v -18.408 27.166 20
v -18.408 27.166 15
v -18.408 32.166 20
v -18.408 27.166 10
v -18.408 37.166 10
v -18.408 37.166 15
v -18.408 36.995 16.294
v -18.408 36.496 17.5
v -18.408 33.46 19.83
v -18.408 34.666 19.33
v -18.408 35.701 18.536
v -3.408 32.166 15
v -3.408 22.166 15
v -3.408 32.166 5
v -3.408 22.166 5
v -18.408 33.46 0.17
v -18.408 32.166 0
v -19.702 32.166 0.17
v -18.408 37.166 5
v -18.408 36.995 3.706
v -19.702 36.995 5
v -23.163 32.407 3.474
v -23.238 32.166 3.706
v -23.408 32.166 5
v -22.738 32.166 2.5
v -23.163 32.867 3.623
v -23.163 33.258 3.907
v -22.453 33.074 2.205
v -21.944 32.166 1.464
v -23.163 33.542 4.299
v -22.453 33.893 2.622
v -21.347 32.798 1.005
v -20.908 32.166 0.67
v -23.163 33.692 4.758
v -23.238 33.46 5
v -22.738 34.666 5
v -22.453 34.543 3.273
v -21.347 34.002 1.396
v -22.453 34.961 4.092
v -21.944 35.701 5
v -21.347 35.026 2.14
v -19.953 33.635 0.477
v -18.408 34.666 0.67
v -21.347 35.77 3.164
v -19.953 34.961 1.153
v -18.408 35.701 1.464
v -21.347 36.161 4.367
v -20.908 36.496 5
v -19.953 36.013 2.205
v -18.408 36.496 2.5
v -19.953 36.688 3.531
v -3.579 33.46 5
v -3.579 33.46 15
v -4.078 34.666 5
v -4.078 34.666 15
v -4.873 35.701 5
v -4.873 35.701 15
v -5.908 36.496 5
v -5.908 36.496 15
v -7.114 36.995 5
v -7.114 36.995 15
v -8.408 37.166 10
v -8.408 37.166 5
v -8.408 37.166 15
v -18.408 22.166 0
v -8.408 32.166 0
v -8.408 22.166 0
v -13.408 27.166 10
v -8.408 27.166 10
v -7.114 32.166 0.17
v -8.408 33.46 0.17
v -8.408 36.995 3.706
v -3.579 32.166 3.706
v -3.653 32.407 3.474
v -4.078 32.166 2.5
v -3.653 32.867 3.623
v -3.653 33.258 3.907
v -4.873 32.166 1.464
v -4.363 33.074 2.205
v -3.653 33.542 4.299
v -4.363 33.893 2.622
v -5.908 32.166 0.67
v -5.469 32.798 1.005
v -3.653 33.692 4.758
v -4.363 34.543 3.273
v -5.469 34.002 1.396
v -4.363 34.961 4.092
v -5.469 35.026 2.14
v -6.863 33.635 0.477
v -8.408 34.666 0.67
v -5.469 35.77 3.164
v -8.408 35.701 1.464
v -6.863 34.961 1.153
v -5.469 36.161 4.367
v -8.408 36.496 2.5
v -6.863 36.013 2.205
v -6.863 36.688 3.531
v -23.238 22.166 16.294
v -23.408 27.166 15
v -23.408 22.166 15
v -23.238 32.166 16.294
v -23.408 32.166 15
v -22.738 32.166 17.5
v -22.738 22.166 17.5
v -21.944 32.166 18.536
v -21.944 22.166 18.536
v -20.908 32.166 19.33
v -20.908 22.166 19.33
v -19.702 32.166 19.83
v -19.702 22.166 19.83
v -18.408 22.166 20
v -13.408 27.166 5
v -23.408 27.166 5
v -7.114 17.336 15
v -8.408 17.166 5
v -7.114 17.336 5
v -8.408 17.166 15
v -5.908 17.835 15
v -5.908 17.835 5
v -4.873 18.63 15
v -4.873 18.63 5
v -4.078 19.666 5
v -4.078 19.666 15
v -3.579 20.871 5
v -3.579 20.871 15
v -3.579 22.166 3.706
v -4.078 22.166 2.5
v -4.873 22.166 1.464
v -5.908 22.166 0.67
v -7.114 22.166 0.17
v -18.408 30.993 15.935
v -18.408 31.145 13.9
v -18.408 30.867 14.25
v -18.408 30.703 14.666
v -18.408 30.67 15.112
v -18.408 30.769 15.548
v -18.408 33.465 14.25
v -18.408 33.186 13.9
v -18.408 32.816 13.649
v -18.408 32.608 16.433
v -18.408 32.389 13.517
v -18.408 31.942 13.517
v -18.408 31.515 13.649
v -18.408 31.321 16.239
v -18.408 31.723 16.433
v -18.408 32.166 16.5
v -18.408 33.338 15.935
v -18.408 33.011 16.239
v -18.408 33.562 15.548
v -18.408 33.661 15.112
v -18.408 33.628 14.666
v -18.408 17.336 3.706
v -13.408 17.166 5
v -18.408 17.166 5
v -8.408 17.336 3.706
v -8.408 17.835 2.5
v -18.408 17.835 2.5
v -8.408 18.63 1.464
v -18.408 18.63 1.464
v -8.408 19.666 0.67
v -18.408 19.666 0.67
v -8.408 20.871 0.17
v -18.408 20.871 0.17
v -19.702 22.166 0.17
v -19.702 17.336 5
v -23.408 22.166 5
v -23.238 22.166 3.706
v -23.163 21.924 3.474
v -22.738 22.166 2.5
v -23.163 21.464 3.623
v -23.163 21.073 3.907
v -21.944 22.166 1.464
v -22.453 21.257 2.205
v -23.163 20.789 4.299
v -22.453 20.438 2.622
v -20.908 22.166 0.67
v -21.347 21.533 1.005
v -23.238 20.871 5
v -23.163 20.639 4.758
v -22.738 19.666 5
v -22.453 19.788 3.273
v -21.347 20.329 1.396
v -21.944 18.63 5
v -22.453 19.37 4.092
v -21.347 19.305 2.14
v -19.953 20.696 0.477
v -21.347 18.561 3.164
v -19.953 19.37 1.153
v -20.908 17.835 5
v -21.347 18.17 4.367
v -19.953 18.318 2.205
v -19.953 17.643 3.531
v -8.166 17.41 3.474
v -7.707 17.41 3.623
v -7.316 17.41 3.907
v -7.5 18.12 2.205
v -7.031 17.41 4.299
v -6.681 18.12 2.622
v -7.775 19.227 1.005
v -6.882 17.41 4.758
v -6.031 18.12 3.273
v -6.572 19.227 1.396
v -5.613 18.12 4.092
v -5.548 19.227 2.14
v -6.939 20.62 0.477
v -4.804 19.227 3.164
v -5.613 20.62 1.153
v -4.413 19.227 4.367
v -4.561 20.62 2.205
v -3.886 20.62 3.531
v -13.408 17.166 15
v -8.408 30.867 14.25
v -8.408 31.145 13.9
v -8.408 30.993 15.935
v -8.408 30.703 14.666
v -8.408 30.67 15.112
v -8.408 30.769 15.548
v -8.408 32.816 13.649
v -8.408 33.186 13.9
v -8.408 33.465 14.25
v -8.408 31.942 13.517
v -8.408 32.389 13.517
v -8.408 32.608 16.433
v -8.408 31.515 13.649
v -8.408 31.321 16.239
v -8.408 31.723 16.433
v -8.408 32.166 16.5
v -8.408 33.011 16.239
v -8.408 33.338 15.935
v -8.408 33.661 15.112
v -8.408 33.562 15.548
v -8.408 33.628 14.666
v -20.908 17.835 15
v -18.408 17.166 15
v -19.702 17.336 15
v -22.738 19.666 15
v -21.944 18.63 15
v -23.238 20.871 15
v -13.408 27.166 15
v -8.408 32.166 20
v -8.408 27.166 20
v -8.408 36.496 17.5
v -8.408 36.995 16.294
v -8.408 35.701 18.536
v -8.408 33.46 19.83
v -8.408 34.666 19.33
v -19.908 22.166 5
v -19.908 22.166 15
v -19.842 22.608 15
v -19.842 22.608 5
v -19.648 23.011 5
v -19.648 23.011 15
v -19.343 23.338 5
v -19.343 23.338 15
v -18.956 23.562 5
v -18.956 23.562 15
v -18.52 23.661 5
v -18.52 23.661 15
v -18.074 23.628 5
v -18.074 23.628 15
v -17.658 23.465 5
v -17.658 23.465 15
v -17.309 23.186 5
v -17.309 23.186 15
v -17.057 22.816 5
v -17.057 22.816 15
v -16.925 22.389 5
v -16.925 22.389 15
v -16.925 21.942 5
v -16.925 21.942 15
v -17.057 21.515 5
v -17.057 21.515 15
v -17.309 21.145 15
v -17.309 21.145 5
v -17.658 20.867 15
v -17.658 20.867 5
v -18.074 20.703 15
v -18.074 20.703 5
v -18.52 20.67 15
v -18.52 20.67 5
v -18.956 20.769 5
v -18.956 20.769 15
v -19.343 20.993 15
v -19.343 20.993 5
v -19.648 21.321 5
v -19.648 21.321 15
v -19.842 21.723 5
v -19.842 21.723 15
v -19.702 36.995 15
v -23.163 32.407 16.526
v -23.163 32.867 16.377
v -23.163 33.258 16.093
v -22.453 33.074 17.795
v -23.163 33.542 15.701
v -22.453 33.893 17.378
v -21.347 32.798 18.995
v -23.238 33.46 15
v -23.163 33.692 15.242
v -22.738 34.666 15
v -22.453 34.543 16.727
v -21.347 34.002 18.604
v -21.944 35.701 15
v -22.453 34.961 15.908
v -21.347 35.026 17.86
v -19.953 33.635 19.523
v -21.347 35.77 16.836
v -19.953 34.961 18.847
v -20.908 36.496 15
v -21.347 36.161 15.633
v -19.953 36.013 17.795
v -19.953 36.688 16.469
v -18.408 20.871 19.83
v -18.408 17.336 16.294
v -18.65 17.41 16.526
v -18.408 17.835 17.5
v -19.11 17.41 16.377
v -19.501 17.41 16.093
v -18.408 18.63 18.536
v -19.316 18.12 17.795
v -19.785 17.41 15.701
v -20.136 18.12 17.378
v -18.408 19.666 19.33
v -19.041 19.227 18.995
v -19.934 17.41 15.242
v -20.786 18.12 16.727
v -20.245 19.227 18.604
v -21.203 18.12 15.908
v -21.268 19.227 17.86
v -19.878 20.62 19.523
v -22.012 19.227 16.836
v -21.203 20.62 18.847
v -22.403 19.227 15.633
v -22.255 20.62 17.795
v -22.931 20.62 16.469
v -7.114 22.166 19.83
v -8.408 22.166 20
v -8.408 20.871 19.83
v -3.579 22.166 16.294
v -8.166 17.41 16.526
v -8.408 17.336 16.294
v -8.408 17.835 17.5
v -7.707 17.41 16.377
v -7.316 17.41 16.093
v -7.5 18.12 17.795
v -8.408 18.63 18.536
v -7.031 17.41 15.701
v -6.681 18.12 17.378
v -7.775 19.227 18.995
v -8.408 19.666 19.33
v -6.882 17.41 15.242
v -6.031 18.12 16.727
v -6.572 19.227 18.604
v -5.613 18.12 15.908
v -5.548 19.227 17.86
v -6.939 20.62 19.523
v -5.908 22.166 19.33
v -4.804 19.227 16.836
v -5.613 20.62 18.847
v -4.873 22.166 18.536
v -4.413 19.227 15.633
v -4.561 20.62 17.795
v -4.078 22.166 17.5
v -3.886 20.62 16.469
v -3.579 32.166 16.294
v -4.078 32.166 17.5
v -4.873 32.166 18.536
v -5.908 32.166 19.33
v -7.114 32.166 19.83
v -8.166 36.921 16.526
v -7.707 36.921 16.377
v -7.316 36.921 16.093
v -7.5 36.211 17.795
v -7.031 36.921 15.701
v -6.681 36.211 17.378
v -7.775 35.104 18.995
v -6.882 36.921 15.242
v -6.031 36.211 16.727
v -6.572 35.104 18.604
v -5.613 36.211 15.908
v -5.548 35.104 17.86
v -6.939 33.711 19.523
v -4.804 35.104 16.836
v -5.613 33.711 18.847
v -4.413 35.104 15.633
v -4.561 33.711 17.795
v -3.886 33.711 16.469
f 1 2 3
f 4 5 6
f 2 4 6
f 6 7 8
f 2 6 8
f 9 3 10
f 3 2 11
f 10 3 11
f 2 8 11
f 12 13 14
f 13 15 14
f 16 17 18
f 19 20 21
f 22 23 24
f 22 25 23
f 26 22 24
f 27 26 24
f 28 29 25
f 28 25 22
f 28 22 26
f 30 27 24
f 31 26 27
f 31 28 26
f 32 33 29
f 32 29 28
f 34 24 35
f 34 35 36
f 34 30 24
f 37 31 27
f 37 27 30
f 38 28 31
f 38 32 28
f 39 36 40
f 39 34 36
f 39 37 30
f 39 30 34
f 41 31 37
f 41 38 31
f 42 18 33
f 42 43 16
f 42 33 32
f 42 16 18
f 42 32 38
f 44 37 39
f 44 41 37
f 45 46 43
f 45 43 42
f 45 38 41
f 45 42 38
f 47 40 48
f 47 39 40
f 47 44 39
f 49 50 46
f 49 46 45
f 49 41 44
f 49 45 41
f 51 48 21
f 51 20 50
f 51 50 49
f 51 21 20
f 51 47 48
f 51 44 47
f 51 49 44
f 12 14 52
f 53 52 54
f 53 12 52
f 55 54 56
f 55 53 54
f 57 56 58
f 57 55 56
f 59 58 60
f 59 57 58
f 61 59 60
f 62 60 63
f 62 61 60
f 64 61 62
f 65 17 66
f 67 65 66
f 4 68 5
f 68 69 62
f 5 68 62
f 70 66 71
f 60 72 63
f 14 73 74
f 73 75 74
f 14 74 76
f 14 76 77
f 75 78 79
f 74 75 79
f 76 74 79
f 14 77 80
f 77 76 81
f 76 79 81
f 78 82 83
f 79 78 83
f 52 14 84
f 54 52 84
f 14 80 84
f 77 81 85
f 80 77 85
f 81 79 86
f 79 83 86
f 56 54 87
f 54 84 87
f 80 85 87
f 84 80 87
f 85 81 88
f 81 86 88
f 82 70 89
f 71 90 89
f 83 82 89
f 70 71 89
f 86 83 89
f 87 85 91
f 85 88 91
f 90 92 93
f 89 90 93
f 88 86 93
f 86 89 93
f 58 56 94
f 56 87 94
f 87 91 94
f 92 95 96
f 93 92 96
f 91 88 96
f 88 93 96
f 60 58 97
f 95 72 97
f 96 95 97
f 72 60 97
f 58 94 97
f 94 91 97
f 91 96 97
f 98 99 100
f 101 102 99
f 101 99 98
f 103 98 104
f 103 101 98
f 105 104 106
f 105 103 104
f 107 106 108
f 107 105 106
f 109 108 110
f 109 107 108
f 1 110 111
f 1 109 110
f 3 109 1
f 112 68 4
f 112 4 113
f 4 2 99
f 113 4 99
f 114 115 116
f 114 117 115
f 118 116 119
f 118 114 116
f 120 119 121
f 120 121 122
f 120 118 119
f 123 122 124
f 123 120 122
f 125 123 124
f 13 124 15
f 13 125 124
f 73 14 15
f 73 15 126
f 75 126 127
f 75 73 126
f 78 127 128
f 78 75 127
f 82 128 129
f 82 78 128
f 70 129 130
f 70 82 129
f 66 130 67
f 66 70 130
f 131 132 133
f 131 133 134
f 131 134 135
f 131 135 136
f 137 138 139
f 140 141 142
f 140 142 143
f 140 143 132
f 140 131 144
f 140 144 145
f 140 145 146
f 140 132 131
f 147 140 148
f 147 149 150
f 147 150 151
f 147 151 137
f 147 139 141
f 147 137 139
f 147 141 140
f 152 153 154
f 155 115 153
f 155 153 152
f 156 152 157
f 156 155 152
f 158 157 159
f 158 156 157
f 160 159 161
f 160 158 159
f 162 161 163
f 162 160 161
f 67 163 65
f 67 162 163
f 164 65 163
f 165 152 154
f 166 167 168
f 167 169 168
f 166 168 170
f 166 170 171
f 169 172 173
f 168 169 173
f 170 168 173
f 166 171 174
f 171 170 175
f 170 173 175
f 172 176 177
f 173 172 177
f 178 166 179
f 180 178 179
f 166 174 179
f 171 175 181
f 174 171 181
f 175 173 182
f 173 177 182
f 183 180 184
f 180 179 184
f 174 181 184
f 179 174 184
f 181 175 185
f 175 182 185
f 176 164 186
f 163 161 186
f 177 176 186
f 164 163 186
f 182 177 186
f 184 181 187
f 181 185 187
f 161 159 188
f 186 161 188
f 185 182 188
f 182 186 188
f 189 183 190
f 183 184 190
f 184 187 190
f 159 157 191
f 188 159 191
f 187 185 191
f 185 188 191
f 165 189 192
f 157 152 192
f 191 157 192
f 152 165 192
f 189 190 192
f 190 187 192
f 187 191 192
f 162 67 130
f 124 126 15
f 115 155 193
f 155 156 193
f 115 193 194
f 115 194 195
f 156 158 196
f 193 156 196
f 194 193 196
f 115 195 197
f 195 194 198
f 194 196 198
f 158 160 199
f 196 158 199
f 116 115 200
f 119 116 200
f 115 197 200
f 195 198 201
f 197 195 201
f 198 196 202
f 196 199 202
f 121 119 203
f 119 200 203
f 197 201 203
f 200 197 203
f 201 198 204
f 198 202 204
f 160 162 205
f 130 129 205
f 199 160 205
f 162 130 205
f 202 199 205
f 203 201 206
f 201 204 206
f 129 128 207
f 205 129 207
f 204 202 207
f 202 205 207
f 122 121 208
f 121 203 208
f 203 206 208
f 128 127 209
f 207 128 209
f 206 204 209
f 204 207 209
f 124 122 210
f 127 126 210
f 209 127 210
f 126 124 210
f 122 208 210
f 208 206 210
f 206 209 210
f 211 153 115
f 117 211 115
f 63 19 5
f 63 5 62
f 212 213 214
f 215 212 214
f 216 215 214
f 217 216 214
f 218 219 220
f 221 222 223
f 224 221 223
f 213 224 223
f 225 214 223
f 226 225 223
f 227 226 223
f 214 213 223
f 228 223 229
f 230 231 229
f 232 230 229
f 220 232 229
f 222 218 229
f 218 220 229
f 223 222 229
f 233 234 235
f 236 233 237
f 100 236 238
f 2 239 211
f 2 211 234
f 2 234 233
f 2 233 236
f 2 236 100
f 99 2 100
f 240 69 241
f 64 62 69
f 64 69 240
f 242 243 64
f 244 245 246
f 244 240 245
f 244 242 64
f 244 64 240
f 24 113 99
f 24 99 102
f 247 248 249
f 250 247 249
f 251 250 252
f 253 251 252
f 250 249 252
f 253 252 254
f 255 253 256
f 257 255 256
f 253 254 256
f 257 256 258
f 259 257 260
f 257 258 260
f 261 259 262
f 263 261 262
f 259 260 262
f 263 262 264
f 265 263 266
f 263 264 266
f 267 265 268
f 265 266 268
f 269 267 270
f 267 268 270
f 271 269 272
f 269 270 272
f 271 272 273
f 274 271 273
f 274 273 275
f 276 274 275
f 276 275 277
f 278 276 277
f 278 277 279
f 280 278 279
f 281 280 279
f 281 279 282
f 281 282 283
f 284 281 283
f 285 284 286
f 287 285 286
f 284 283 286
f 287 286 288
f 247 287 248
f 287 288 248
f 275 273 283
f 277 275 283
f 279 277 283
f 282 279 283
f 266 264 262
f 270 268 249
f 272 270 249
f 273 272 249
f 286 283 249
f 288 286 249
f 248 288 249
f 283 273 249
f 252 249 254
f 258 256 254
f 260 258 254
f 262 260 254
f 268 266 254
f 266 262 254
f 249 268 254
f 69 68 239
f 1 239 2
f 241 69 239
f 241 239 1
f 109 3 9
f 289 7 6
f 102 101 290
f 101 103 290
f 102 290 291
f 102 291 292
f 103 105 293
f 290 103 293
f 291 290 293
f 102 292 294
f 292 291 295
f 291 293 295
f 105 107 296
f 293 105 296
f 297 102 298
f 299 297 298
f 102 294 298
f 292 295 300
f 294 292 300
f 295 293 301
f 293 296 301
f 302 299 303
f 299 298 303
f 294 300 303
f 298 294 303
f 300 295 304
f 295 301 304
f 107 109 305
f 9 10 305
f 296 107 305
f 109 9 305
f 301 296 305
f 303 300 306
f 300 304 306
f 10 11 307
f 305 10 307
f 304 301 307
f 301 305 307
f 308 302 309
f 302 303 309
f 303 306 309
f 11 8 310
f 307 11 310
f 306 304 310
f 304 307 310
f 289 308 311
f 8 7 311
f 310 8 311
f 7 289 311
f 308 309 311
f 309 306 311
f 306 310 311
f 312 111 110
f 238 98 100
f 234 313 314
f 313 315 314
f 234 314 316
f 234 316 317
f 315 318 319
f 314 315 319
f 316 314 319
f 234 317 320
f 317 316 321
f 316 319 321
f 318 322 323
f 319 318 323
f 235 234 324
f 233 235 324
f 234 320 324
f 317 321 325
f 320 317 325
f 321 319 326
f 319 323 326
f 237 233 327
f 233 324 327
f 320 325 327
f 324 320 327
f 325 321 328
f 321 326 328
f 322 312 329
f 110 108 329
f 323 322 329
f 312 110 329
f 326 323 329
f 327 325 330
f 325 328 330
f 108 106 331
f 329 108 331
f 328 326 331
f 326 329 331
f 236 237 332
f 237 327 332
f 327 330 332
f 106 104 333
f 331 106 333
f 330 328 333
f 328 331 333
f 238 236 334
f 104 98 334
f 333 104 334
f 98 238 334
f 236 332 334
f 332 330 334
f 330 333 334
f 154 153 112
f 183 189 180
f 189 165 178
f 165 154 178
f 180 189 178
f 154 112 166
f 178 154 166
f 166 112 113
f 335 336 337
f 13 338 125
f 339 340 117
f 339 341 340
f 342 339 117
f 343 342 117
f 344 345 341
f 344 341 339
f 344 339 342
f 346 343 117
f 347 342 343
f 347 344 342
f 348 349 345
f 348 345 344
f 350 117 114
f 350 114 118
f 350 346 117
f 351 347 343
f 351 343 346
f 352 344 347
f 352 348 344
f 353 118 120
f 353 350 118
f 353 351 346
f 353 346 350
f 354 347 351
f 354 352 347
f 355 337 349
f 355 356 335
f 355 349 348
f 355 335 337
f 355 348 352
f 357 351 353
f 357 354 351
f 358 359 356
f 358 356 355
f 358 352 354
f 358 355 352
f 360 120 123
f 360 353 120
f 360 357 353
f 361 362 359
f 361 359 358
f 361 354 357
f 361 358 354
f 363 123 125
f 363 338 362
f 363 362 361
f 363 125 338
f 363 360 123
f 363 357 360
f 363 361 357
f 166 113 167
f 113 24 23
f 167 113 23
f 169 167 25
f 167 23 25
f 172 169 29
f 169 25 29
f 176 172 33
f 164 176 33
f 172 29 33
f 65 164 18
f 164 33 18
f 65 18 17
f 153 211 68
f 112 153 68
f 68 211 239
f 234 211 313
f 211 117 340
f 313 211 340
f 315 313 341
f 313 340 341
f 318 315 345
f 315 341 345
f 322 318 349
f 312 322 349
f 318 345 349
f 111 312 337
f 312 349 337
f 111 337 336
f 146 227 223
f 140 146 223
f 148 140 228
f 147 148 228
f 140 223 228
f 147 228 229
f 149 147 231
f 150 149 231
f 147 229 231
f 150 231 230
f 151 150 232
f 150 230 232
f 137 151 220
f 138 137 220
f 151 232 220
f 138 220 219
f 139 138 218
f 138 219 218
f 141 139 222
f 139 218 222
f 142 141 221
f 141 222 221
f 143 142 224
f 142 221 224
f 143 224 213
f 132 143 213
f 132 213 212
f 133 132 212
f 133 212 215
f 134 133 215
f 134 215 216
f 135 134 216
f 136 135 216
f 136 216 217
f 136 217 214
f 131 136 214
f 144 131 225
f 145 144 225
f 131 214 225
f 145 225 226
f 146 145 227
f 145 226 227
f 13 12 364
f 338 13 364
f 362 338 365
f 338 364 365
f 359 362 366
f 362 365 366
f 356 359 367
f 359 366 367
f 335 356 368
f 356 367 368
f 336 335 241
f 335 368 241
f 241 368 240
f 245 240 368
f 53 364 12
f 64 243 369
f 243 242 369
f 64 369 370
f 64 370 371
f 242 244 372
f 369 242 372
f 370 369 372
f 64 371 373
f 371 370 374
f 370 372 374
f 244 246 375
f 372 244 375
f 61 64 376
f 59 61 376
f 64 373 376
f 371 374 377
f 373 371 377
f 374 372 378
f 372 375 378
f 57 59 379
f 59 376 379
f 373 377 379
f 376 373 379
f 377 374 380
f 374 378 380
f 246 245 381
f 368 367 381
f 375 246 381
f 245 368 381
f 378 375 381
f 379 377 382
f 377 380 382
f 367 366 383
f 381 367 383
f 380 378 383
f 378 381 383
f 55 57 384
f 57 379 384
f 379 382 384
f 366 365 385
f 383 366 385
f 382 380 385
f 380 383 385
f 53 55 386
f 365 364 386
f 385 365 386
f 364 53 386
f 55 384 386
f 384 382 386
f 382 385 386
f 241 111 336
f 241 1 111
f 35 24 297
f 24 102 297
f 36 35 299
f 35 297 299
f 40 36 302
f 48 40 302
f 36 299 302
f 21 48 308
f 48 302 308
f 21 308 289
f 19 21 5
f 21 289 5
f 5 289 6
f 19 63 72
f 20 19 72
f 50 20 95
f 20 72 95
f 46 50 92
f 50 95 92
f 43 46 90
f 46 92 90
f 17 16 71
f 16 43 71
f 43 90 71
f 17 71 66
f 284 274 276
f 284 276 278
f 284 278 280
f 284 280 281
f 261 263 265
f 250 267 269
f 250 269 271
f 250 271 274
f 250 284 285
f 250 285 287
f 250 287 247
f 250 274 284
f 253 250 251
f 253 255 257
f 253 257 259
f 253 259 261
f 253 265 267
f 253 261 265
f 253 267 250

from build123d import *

# Parameters (mm, degrees)
SKETCH_1_W          = 20
SKETCH_1_H          = 20
EXTRUDE_1_DEPTH     = 20
FILLET_1_R          = 5
SKETCH_2_W          = 10
SKETCH_2_H          = 10
CUT_EXTRUDE_1_DEPTH = 10
SKETCH_3_W          = 10
SKETCH_3_H          = 10
CUT_EXTRUDE_2_DEPTH = 10
SKETCH_4_R          = 1.5
EXTRUDE_2_DEPTH     = 10
SKETCH_5_R          = 1.5
EXTRUDE_3_DEPTH     = 10


with BuildPart() as part:
    # 草图1 → 凸台-拉伸1 (new body)
    with BuildSketch(Plane.XY):
        with Locations((-13.408142688, 27.165559881)):
            Rectangle(SKETCH_1_W, SKETCH_1_H)
    extrude(amount=EXTRUDE_1_DEPTH)

    # 圆角1
    fillet_1_edges = [part.edges().sort_by_distance(p)[0] for p in [
        (-3.408142688, 27.165559881, 20),
        (-13.408142688, 37.165559881, 20),
        (-23.408142688, 27.165559881, 20),
        (-13.408142688, 37.165559881, 0),
        (-3.408142688, 27.165559881, 0),
        (-13.408142688, 17.165559881, 0),
        (-23.408142688, 27.165559881, 0),
        (-13.408142688, 17.165559881, 20),
        (-23.408142688, 37.165559881, 10),
        (-3.408142688, 37.165559881, 10),
        (-3.408142688, 17.165559881, 10),
        (-23.408142688, 17.165559881, 10),
    ]]
    fillet(fillet_1_edges, radius=FILLET_1_R)

    # 草图2 → 切除-拉伸1 (cut)
    with BuildSketch(Plane.ZY.offset(8.408142688)):
        with Locations((15, 32.165559881)):
            Rectangle(SKETCH_2_W, SKETCH_2_H)
    extrude(amount=CUT_EXTRUDE_1_DEPTH, mode=Mode.SUBTRACT)

    # 草图3 → 切除-拉伸2 (cut)
    with BuildSketch(Plane(origin=(0, 0, 15), x_dir=(-1, 0, 0), z_dir=(0, 0, -1))):
        with Locations((18.408142688, 22.165559881)):
            Rectangle(SKETCH_3_W, SKETCH_3_H)
    extrude(amount=CUT_EXTRUDE_2_DEPTH, mode=Mode.SUBTRACT)


with BuildPart() as body_2:
    # 草图4 → 凸台-拉伸2 (new body)
    with BuildSketch(Plane.ZY.offset(8.408142688)):
        with Locations((15, 32.165559881)):
            Circle(SKETCH_4_R)
    extrude(amount=EXTRUDE_2_DEPTH)


with BuildPart() as body_3:
    # 草图5 → 凸台-拉伸3 (new body)
    with BuildSketch(Plane(origin=(0, 0, 15), x_dir=(-1, 0, 0), z_dir=(0, 0, -1))):
        with Locations((18.408142688, 22.165559881)):
            Circle(SKETCH_5_R)
    extrude(amount=EXTRUDE_3_DEPTH)


solid = Compound([part.part, body_2.part, body_3.part])
